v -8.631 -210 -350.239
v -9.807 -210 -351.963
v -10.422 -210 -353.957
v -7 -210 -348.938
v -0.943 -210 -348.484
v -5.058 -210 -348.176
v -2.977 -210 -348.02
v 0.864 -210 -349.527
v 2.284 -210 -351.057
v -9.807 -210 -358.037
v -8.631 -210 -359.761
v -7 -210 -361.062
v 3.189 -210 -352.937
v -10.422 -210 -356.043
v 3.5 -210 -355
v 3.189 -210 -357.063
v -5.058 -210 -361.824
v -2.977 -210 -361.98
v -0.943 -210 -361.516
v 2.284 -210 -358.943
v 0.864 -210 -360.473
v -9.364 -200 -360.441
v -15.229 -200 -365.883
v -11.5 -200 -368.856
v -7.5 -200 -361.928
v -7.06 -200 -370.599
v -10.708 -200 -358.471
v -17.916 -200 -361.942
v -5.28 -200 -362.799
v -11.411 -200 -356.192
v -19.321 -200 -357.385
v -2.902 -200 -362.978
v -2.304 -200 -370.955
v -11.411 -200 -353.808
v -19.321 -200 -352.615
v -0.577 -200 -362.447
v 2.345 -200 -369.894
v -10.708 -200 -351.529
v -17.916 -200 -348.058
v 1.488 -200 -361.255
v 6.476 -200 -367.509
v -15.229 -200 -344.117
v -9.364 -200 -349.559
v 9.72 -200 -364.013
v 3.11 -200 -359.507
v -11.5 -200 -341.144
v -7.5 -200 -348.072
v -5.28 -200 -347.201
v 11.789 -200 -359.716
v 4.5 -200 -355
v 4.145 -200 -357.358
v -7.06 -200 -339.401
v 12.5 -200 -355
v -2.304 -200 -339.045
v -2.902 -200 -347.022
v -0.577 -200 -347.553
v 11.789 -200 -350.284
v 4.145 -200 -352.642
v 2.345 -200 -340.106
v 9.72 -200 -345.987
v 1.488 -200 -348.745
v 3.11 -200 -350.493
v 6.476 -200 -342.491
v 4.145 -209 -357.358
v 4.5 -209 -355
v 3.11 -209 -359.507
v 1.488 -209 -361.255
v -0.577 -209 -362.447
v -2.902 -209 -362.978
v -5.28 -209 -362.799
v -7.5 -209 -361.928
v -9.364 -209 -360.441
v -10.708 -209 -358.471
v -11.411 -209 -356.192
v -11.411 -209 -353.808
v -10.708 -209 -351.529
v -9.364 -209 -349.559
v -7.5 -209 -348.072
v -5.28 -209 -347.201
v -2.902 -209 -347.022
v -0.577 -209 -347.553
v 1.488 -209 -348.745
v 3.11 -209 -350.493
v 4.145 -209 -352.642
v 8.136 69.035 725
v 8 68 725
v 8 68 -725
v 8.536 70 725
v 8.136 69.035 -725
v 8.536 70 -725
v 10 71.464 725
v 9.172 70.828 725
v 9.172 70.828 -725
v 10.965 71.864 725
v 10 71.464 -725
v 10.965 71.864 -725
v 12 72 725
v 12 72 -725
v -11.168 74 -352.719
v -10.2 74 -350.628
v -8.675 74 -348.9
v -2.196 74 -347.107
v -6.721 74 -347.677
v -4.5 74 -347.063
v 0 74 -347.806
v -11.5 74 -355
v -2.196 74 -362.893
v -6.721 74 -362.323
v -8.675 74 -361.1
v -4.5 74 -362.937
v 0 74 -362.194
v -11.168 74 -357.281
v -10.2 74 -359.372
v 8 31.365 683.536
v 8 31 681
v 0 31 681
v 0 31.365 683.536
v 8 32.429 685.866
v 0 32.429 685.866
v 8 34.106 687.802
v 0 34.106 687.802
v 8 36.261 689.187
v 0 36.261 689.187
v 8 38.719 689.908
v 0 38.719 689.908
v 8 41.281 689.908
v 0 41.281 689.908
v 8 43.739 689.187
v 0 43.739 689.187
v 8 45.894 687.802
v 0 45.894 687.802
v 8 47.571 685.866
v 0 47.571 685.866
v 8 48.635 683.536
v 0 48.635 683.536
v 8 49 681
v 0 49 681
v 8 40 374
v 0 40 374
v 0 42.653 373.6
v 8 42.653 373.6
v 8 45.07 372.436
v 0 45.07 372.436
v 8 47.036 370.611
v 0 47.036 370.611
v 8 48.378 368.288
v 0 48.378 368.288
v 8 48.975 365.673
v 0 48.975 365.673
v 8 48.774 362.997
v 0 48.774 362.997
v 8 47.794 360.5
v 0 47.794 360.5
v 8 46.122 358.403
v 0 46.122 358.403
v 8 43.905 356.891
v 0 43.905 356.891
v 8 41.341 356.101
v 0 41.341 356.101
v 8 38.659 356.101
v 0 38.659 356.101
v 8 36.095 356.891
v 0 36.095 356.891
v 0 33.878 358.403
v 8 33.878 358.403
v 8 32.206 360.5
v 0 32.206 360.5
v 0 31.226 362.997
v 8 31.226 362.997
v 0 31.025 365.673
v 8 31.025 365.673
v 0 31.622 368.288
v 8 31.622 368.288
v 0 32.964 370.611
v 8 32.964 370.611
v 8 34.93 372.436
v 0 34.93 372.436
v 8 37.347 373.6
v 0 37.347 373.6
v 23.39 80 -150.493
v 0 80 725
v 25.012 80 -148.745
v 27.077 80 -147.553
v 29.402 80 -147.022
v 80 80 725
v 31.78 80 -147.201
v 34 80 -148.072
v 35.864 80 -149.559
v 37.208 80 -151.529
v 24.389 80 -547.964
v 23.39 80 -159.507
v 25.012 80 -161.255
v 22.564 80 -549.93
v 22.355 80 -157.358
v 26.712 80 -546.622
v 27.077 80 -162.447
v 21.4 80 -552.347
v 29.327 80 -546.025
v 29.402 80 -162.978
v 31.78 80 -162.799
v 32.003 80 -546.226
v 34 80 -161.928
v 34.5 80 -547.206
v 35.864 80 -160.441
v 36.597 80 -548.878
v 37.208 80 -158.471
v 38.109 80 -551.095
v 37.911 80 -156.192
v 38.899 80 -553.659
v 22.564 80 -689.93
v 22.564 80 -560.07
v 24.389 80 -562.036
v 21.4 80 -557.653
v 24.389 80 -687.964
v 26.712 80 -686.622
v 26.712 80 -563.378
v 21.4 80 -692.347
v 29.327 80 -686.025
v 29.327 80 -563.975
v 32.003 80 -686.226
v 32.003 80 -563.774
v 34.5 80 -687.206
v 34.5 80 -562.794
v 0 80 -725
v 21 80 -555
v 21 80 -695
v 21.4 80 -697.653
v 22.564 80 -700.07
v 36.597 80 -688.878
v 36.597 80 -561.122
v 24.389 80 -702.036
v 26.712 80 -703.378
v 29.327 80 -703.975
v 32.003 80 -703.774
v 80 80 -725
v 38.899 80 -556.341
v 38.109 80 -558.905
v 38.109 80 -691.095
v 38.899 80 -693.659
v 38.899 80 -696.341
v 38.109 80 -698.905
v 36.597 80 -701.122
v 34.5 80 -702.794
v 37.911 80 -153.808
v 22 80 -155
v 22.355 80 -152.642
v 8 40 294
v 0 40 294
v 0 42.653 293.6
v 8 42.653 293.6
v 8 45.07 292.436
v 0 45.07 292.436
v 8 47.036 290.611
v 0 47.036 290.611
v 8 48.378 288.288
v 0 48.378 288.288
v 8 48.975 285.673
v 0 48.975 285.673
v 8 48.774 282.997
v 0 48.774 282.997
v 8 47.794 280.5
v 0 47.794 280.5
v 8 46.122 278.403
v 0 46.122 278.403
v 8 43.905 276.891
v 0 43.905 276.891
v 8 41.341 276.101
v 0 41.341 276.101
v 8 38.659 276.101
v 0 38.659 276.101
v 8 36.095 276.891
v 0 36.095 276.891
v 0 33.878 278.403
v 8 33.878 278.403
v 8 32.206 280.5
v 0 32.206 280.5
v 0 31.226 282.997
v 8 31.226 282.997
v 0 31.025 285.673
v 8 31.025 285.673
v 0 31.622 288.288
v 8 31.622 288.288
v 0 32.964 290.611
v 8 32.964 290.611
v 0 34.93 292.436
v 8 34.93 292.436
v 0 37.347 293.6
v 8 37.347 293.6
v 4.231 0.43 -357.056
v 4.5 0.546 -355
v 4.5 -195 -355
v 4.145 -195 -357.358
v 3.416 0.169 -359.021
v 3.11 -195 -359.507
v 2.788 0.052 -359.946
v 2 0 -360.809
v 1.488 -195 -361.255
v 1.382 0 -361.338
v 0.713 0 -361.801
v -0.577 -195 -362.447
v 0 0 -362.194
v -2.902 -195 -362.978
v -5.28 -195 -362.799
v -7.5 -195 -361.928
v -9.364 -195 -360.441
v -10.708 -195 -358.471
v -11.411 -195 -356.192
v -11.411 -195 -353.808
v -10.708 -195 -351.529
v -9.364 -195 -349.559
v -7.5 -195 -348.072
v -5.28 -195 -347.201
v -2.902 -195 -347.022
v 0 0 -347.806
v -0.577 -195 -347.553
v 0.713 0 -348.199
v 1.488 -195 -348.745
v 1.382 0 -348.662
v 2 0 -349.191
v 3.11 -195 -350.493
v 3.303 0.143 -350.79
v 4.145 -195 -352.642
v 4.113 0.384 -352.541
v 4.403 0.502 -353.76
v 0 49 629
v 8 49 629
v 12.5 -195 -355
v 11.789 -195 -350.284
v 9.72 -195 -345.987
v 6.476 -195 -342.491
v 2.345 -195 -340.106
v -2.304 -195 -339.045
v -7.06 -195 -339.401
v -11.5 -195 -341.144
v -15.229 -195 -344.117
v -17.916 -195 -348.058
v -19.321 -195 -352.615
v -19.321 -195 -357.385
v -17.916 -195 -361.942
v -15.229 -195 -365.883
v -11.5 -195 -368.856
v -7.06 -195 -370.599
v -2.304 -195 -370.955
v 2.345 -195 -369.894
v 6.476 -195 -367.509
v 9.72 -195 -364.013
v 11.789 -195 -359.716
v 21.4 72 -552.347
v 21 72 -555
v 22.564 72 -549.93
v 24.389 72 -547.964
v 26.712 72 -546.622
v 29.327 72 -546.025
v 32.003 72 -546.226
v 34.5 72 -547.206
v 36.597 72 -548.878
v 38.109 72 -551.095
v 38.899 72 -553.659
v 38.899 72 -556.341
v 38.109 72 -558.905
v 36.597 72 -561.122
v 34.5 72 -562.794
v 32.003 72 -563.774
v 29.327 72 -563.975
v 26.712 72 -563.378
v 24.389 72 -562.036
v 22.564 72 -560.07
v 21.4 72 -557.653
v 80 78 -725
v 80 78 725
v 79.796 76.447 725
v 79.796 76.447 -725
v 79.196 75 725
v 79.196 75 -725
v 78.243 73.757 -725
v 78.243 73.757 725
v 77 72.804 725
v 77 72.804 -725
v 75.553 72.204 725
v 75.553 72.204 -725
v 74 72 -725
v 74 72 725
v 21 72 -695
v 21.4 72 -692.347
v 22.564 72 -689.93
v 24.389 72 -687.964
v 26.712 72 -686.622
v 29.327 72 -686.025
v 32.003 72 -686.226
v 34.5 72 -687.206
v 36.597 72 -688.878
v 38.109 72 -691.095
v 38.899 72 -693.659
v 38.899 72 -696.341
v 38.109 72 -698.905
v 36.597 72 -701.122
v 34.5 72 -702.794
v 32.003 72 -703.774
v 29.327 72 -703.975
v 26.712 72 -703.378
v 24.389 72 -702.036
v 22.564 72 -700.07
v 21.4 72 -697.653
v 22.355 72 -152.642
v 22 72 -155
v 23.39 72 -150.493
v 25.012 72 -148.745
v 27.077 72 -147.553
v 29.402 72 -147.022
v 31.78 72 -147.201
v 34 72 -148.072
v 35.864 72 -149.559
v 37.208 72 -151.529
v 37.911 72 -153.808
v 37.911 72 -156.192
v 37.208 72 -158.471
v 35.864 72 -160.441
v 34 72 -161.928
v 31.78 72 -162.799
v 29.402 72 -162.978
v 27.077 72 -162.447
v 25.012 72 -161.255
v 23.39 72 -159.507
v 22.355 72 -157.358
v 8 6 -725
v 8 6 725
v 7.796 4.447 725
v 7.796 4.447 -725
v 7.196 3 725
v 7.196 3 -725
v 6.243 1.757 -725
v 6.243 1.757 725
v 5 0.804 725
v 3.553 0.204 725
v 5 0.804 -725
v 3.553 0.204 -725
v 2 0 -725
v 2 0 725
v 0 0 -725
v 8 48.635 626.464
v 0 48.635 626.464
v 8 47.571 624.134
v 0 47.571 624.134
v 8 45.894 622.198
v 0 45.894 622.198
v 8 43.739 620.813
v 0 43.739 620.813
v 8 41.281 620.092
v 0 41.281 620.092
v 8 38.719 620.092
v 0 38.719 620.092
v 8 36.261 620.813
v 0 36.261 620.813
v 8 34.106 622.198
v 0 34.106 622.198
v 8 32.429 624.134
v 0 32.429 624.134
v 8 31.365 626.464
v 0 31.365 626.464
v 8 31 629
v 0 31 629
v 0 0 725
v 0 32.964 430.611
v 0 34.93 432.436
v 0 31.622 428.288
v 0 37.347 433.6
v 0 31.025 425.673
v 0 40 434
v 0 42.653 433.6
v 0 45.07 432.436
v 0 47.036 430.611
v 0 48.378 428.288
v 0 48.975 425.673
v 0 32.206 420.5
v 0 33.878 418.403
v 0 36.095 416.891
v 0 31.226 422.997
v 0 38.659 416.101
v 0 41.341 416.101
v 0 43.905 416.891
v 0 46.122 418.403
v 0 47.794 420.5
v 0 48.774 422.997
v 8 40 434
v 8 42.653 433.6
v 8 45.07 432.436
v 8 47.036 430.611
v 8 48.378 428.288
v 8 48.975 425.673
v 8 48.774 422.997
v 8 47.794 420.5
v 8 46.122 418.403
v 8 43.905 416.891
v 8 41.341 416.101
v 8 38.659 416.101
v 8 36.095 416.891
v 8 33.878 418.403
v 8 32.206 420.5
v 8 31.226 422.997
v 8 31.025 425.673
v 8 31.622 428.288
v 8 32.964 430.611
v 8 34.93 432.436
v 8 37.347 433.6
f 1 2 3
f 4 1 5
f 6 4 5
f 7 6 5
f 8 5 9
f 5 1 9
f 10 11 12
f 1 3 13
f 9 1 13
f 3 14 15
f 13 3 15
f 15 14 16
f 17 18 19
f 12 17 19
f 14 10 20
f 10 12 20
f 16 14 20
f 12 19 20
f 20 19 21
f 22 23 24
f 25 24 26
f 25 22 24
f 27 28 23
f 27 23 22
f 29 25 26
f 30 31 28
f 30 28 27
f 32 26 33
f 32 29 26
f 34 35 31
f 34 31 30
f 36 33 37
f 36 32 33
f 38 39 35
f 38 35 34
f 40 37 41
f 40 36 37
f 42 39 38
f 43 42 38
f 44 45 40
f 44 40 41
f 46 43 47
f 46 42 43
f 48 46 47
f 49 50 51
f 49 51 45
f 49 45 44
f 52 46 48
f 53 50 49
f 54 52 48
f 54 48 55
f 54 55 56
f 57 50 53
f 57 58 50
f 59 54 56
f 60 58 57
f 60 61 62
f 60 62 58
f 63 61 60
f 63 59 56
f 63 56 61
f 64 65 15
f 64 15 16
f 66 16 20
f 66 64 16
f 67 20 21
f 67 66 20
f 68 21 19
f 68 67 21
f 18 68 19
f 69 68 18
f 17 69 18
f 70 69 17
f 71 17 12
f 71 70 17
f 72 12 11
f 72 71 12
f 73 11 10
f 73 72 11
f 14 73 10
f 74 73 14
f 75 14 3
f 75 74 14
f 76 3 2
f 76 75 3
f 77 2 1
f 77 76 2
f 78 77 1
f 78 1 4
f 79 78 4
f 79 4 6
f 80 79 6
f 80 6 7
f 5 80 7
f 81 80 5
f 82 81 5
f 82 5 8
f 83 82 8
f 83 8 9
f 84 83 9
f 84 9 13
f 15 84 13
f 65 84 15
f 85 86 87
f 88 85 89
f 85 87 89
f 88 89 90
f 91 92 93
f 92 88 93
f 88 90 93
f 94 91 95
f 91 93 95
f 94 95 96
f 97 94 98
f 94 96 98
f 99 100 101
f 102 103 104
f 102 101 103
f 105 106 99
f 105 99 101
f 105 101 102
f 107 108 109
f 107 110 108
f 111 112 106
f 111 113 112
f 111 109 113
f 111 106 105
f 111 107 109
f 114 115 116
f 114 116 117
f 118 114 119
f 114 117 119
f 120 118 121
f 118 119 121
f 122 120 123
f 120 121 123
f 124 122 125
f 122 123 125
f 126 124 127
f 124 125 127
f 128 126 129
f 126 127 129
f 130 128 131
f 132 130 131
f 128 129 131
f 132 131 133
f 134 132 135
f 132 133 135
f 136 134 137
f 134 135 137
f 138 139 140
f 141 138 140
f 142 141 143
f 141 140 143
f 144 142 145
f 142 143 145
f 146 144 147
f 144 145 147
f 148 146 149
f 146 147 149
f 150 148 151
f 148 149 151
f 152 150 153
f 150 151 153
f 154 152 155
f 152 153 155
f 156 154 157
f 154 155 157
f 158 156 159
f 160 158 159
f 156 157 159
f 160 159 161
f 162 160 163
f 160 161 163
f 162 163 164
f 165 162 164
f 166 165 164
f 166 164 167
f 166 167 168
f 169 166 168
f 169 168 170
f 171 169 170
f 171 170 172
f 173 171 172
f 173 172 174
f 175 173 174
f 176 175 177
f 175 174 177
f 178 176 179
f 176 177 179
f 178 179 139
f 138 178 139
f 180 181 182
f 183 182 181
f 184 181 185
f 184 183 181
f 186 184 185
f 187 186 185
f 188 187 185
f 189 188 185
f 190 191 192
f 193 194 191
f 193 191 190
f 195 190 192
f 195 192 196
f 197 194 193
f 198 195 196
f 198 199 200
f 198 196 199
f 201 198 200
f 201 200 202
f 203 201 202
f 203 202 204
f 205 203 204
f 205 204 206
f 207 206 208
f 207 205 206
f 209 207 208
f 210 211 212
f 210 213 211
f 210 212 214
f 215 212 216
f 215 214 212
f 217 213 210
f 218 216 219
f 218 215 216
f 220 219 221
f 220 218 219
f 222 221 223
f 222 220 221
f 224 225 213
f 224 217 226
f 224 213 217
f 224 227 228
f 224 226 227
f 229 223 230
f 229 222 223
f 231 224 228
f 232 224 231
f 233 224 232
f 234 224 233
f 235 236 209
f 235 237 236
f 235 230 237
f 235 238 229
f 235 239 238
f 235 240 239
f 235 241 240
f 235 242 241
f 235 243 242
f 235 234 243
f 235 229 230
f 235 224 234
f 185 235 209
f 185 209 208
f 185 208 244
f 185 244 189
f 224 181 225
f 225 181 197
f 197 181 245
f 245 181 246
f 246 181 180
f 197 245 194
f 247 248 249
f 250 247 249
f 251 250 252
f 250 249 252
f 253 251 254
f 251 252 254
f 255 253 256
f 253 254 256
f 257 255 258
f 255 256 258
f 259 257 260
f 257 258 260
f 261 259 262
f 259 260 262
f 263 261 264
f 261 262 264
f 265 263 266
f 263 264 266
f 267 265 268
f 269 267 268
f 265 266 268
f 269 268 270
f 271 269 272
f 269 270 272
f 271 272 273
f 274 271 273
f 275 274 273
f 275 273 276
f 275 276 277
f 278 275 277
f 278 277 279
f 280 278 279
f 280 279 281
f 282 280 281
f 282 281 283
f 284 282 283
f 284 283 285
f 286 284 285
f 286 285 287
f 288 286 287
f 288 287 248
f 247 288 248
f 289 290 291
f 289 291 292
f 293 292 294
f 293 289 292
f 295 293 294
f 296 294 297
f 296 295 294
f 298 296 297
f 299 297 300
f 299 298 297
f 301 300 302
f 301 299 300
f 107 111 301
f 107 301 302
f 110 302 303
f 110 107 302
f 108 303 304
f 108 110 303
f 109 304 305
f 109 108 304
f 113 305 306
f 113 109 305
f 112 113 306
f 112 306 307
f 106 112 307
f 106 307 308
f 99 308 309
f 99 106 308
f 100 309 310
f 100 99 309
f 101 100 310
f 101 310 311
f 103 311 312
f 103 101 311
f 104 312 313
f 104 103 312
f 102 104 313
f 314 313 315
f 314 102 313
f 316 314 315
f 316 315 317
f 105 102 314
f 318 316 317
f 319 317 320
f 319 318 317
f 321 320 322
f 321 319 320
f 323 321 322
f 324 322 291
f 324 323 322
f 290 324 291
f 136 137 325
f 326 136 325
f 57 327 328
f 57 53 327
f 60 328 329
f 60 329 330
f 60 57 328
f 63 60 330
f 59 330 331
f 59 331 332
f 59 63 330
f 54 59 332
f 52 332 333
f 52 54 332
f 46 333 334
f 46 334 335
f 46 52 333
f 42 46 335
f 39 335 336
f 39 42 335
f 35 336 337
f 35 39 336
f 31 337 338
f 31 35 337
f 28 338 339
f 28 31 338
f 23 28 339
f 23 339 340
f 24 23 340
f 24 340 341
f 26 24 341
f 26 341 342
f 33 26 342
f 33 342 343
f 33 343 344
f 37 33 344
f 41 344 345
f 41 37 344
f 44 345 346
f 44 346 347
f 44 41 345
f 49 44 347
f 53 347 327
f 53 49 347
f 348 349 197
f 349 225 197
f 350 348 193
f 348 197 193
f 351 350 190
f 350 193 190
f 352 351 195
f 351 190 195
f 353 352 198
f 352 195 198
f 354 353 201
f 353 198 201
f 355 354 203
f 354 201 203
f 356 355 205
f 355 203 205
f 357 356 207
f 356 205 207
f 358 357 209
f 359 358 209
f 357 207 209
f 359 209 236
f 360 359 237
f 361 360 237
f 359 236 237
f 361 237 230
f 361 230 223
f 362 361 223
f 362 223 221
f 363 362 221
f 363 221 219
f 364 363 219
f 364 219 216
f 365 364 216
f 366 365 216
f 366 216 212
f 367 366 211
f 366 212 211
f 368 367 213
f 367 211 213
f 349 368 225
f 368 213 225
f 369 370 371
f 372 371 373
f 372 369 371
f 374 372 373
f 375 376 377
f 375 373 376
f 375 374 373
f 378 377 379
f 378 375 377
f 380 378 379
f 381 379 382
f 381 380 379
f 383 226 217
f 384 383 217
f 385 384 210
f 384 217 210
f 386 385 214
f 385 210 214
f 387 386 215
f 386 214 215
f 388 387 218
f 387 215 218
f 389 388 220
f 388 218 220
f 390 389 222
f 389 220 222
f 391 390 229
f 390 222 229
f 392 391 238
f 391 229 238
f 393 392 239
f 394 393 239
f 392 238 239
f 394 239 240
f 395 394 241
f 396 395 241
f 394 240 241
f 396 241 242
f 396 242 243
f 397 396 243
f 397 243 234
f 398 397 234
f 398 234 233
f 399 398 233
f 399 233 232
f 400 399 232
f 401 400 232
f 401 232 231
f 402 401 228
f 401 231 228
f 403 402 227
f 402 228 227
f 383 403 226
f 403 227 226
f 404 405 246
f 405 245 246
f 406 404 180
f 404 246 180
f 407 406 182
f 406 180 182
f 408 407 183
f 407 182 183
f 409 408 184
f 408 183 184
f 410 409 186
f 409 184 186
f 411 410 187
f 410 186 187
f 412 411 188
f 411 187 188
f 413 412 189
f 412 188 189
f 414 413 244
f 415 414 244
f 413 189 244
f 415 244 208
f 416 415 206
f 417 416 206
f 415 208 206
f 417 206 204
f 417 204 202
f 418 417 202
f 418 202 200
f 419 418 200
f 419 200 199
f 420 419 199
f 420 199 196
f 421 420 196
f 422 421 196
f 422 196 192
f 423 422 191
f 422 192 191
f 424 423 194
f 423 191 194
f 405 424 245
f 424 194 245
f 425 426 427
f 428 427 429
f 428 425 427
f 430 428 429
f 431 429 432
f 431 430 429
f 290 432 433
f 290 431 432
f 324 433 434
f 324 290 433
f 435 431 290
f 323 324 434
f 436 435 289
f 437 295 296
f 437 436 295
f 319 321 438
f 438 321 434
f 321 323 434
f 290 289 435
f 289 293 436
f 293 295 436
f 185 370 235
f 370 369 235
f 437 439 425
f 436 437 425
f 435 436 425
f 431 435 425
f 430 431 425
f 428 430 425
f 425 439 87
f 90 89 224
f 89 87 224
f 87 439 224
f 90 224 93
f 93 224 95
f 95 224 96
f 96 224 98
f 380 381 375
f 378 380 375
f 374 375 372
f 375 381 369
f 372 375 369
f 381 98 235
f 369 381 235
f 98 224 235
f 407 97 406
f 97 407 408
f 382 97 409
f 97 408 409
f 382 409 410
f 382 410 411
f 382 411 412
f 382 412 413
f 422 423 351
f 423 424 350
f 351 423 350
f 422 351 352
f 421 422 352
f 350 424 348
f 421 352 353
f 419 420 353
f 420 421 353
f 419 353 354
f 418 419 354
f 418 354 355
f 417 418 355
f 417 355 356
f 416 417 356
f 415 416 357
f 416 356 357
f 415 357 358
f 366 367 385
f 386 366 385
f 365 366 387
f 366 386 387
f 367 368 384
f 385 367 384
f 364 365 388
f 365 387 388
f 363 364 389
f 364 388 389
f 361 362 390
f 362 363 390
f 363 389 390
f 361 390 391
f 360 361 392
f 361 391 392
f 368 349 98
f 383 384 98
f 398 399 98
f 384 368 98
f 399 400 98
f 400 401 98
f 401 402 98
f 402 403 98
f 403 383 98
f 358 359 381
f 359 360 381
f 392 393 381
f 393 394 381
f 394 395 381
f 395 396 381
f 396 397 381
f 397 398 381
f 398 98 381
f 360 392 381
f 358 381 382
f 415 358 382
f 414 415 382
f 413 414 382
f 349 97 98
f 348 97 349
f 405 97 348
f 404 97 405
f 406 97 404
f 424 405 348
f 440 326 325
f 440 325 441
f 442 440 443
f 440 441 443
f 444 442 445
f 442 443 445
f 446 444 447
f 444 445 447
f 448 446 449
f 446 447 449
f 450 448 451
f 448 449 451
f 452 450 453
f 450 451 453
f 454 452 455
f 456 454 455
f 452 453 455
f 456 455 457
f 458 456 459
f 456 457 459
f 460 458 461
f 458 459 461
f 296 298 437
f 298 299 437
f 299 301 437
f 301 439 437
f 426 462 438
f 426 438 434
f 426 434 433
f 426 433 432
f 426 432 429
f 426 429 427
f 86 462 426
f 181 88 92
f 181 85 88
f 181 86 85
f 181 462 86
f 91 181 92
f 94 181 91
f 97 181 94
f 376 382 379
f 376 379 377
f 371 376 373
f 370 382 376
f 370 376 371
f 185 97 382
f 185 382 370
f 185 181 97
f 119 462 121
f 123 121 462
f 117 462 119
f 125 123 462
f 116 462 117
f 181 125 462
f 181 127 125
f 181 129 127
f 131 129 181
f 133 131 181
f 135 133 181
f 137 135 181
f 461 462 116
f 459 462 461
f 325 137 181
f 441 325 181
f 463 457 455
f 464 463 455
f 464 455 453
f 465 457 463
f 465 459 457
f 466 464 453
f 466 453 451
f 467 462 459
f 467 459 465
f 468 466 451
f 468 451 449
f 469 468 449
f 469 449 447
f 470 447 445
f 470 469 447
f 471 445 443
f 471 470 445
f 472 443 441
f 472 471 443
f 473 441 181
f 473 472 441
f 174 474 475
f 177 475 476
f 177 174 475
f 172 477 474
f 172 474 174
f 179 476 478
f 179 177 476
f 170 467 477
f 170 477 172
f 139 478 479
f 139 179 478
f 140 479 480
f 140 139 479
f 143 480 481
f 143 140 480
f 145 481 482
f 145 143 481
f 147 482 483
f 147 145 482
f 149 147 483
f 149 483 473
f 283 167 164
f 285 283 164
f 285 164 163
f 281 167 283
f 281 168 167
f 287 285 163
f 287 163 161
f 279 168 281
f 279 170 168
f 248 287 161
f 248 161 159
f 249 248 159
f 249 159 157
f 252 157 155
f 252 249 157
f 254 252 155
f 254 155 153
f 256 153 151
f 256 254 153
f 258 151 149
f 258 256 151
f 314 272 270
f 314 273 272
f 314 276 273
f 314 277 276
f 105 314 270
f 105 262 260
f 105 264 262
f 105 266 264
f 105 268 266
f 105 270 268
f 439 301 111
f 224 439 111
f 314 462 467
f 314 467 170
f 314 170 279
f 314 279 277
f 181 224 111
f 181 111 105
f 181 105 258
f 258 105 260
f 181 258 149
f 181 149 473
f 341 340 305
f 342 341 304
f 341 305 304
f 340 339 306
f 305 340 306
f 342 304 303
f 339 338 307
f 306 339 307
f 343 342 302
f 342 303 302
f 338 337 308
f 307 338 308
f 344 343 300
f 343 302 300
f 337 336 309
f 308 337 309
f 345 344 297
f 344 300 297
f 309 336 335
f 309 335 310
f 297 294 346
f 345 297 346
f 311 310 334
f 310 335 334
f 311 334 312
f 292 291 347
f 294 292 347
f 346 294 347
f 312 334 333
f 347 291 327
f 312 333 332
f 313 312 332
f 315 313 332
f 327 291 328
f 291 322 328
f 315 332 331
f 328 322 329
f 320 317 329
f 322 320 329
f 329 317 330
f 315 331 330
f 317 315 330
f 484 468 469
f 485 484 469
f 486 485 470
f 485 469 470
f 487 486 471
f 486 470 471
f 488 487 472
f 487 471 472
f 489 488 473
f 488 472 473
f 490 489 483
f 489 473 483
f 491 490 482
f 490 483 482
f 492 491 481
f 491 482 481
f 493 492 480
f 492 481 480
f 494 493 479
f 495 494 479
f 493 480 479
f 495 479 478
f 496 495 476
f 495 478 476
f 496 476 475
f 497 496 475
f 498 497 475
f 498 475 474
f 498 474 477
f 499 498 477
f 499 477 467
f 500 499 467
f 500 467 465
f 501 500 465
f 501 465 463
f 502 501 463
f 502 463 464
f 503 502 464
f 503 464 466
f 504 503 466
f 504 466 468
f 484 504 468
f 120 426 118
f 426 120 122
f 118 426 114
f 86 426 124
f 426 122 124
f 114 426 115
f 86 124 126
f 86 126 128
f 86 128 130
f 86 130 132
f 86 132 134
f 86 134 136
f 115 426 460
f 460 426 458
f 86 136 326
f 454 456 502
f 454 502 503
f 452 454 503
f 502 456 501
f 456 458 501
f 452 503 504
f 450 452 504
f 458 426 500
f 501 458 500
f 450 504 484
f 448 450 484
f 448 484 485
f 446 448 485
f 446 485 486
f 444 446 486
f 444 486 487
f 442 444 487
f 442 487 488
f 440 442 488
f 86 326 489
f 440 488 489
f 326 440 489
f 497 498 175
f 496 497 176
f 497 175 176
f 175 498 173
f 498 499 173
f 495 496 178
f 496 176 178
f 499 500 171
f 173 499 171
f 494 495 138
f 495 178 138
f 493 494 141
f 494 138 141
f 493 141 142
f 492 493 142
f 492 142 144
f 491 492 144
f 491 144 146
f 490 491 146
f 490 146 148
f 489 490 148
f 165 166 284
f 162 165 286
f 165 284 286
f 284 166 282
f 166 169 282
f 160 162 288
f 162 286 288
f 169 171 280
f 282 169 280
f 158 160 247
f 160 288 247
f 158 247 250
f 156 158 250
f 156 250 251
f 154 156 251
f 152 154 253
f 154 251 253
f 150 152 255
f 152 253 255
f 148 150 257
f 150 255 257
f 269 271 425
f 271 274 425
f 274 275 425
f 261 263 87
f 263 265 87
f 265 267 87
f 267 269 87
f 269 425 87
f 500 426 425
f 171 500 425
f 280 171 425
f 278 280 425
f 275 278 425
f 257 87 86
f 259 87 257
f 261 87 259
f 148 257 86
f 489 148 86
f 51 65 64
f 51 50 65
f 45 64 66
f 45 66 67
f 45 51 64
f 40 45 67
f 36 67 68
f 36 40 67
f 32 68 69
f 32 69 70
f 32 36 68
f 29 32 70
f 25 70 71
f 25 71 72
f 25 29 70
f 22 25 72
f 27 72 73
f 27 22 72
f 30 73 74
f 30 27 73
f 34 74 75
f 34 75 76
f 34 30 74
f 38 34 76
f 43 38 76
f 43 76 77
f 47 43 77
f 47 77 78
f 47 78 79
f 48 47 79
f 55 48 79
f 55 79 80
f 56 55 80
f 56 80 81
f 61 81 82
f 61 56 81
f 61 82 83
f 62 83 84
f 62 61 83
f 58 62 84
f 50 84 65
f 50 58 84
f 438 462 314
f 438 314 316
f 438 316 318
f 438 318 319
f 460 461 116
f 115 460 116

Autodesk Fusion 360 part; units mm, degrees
sketch "Sketch1" plane through (0, 0, 0) normal (0, 0, 1) x (1, 0, 0)
  line L0 (0, 0) -> (0, 80)
  line L1 (0, 80) -> (80, 80)
  line L2 (8, 6) -> (8, 68)
  line L3 (12, 72) -> (74, 72)
  line L4 (80, 78) -> (80, 80)
  line L5 (0, 0) -> (2, 0)
  arc A0 (74, 72) -> (80, 78) centre (74, 78) ccw
  arc A1 (2, 0) -> (8, 6) centre (2, 6) ccw
  arc A2 (12, 72) -> (8, 68) centre (12, 68) ccw
  dimension "d1" = 80
  dimension "d2" = 80
  dimension "d4" = 6
  dimension "d5" = 6
  dimension "d6" = 4
extrude "Extrude1" add sketch "Sketch1" along normal mid plane 1450
sketch "Sketch4" plane through (0, 0, 0) normal (-1, 0, 0) x (0, 0, 1)
  line L0 (-725, 0) -> (725, 0) construction
  line L1 (725, 0) -> (725, 80) construction
  line L2 (725, 80) -> (-725, 80) construction
  line L3 (-725, 80) -> (-725, 0) construction
  line L4 (-725, 0) -> (725, 0) construction
  line L5 (-725, 80) -> (725, 80) construction
  line L6 (-725, 0) -> (-725, 80) construction
  line L7 (725, 80) -> (725, 0) construction
  line L8 (0, 0) -> (0, 80) construction
  line L9 (-725, 40) -> (725, 40) construction
  line L10 (-725, 80) -> (-725, -420) construction
  line L11 (285, 80) -> (285, -420) construction
  line L12 (365, 80) -> (365, -420) construction
  line L13 (425, 80) -> (425, -420) construction
  line L14 (620, 80) -> (620, -420) construction
  line L15 (690, 80) -> (690, -420) construction
  line L16 (629, 31) -> (681, 31)
  arc A0 (681, 31) -> (681, 49) centre (681, 40) ccw
  line L17 (681, 49) -> (629, 49)
  arc A1 (629, 49) -> (629, 31) centre (629, 40) ccw
  line L18 (620, 40) -> (690, 40) construction
  circle A2 centre (285, 40) radius 9
  circle A3 centre (365, 40) radius 9
  circle A4 centre (425, 40) radius 9
  dimension "d16" = 1010
  dimension "d17" = 1090
  dimension "d18" = 1150
  dimension "d19" = 1345
  dimension "d20" = 1415
  dimension "d21" = 18
  dimension "d22" = 18
  dimension "d23" = 18
  dimension "d24" = 18
extrude "Extrude4" cut sketch "Sketch4" against normal through all
sketch "Sketch5" plane through (0, 80, 0) normal (0, 1, 0) x (-1, 0, 0)
  line L0 (0, -725) -> (0, 725) construction
  line L1 (0, 725) -> (-80, 725)
  line L2 (-80, 725) -> (-80, -725) construction
  line L3 (-80, -725) -> (0, -725) construction
  line L4 (-80, -725) -> (-80, 725) construction
  line L5 (0, -725) -> (-80, -725) construction
  line L6 (0, -725) -> (0, 725) construction
  line L7 (-30, -725) -> (-30, 725) construction
  line L8 (-80, -725) -> (384.3429, -725) construction
  line L9 (-80, -695) -> (384.3429, -695) construction
  line L10 (-80, -555) -> (384.3429, -555) construction
  line L11 (-80, -155) -> (384.3429, -155) construction
  circle A0 centre (-30, -695) radius 9
  circle A1 centre (-30, -555) radius 9
  circle A2 centre (-30, -155) radius 8
  dimension "d26" = 30
  dimension "d27" = 30
  dimension "d28" = 170
  dimension "d29" = 570
  dimension "d30" = 18
  dimension "d31" = 18
  dimension "d32" = 16
extrude "Extrude5" cut sketch "Sketch5" against normal through all
ref_plane "WorkPlane1" through (40, 74, 0) normal (0, 1, 0) x (-1, 0, 0)
sketch "Sketch6" plane through (40, 74, 0) normal (0, 1, 0) x (1, 0, 0)
  line L0 (-40, 725) -> (-40, -725) construction
  line L1 (-40, 725) -> (40, 725) construction
  line L2 (40, 725) -> (40, -725) construction
  line L3 (40, 725) -> (-288.3779, 725)
  line L4 (40, 355) -> (-288.3779, 355)
  line L5 (-43.5, 725) -> (-43.5, -725) construction
  circle A0 centre (-43.5, 355) radius 8
  dimension "d35" = 370
  dimension "d36" = 3.5
  dimension "d37" = 16
extrude "Extrude6" add sketch "Sketch6" against normal blind 284
ref_plane "WorkPlane2" through (-3.5, -200, -355) normal (0, -1, 0) x (-1, 0, 0)
sketch "Sketch7" plane through (-3.5, -200, -355) normal (0, -1, 0) x (1, 0, 0)
  circle A0 centre (0, 0) radius 16
  dimension "d41" = 32
extrude "Extrude7" add sketch "Sketch7" against normal blind 5
chamfer "Chamfer1" distance 1 angle 45 1 edges at (-10.9586, -210, -357.8929)
